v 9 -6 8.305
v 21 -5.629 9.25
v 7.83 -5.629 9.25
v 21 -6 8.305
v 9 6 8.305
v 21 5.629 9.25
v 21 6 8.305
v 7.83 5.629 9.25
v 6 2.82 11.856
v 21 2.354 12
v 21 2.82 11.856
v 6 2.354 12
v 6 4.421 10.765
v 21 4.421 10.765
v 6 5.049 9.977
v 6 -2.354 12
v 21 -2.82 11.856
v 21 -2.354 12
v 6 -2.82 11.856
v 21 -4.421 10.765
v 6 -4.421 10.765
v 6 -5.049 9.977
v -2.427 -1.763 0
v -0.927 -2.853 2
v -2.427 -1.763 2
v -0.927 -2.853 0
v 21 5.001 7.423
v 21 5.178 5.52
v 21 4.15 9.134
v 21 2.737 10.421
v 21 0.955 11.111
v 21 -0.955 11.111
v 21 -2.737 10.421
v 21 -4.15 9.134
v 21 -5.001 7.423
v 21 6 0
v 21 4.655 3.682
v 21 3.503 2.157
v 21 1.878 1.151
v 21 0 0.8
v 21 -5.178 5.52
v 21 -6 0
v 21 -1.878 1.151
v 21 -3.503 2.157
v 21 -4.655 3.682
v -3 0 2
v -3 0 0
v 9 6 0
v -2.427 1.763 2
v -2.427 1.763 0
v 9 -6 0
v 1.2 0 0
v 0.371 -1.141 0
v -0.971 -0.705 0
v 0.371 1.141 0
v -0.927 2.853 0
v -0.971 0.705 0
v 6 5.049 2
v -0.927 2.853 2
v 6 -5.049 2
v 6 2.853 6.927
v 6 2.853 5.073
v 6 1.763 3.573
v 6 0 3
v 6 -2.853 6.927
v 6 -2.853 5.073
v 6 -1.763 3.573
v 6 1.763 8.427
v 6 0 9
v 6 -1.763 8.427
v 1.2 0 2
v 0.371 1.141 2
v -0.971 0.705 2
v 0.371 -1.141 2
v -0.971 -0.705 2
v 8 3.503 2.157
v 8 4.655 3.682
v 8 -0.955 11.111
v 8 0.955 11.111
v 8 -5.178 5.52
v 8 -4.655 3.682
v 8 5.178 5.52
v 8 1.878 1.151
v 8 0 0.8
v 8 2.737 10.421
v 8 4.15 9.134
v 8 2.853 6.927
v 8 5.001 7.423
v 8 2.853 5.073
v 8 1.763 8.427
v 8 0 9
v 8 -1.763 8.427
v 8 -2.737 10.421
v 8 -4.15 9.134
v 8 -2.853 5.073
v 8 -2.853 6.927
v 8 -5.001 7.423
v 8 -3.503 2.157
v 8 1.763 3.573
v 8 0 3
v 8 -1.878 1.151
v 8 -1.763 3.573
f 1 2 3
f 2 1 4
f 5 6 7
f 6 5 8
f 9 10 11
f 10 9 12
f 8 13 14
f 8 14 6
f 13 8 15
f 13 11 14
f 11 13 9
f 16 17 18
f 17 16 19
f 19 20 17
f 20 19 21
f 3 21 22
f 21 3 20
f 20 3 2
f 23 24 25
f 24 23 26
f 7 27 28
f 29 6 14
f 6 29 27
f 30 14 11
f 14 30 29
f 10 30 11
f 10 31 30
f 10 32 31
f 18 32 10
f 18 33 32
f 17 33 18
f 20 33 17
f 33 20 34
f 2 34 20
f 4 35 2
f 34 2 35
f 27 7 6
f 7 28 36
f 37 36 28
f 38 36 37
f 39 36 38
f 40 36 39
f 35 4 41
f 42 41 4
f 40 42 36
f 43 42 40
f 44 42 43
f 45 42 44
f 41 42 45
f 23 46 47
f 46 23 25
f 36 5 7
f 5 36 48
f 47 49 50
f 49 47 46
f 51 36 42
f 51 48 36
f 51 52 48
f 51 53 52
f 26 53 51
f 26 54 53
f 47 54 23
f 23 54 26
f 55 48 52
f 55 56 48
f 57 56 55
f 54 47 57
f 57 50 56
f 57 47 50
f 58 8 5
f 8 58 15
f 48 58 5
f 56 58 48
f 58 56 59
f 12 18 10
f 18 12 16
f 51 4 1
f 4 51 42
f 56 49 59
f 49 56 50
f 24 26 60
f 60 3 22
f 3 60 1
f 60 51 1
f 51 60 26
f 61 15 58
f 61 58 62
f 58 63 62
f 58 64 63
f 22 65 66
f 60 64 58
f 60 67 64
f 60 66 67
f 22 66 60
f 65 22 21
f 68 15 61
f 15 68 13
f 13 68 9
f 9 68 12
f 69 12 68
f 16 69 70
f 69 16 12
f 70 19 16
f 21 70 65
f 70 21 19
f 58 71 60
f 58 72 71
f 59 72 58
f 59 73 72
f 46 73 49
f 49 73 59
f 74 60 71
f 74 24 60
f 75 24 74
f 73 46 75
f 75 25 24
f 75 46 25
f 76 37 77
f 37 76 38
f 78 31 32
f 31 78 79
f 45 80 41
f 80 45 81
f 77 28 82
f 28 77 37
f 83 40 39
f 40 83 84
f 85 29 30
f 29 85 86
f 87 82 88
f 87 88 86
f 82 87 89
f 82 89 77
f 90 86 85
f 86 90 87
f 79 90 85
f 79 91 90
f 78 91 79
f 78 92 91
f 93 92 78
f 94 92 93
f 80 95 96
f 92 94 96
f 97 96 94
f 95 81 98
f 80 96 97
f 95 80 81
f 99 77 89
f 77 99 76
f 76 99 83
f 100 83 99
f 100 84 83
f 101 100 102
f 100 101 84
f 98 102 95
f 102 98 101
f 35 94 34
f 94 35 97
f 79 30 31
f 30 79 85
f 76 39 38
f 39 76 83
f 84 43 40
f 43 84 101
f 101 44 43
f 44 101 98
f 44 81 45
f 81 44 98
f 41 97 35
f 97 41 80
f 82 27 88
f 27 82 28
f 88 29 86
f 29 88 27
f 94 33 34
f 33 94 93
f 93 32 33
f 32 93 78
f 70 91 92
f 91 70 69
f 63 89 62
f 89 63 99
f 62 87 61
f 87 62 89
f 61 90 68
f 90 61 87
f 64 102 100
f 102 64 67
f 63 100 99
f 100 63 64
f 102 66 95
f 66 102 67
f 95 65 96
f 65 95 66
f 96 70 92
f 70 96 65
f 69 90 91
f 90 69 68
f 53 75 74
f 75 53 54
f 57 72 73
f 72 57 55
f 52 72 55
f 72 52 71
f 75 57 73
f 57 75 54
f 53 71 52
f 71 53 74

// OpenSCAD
module blade_holder_holder_hull(tolerence)
{
    hull()
    {
        circle(r = 3+tolerence);
        translate(v = [15, 0, 0]) square(size = 12+tolerence, center=true);
    }
}

module blade_holder_holder()   
{
    difference() {
        linear_extrude(height = 12)
        { 
            blade_holder_holder_hull(0);

        }
        translate(v=[0, 0, 8]) cube(size = 12, center=true);
        translate(v = [8, 0, 6]) rotate(a = 90, v = [0, 1, 0]) cylinder(h = 20, r = 5.2);
        translate(v = [0, 0, 6]) rotate(a = 90, v = [0, 1, 0]) cylinder(h = 20, r = 3);

        translate(v = [0, 0, -15]) cylinder(h = 30, r = 1.2);

        translate(v = [0, 0, 6]) 
        difference() {
            translate(v = [12, 0, 10]) 
            cube(20, center=true);
            rotate(90,v =[0, 1, 0])
            cylinder(h = 30, r = 6.5);
        }
    }
}

blade_holder_holder();
